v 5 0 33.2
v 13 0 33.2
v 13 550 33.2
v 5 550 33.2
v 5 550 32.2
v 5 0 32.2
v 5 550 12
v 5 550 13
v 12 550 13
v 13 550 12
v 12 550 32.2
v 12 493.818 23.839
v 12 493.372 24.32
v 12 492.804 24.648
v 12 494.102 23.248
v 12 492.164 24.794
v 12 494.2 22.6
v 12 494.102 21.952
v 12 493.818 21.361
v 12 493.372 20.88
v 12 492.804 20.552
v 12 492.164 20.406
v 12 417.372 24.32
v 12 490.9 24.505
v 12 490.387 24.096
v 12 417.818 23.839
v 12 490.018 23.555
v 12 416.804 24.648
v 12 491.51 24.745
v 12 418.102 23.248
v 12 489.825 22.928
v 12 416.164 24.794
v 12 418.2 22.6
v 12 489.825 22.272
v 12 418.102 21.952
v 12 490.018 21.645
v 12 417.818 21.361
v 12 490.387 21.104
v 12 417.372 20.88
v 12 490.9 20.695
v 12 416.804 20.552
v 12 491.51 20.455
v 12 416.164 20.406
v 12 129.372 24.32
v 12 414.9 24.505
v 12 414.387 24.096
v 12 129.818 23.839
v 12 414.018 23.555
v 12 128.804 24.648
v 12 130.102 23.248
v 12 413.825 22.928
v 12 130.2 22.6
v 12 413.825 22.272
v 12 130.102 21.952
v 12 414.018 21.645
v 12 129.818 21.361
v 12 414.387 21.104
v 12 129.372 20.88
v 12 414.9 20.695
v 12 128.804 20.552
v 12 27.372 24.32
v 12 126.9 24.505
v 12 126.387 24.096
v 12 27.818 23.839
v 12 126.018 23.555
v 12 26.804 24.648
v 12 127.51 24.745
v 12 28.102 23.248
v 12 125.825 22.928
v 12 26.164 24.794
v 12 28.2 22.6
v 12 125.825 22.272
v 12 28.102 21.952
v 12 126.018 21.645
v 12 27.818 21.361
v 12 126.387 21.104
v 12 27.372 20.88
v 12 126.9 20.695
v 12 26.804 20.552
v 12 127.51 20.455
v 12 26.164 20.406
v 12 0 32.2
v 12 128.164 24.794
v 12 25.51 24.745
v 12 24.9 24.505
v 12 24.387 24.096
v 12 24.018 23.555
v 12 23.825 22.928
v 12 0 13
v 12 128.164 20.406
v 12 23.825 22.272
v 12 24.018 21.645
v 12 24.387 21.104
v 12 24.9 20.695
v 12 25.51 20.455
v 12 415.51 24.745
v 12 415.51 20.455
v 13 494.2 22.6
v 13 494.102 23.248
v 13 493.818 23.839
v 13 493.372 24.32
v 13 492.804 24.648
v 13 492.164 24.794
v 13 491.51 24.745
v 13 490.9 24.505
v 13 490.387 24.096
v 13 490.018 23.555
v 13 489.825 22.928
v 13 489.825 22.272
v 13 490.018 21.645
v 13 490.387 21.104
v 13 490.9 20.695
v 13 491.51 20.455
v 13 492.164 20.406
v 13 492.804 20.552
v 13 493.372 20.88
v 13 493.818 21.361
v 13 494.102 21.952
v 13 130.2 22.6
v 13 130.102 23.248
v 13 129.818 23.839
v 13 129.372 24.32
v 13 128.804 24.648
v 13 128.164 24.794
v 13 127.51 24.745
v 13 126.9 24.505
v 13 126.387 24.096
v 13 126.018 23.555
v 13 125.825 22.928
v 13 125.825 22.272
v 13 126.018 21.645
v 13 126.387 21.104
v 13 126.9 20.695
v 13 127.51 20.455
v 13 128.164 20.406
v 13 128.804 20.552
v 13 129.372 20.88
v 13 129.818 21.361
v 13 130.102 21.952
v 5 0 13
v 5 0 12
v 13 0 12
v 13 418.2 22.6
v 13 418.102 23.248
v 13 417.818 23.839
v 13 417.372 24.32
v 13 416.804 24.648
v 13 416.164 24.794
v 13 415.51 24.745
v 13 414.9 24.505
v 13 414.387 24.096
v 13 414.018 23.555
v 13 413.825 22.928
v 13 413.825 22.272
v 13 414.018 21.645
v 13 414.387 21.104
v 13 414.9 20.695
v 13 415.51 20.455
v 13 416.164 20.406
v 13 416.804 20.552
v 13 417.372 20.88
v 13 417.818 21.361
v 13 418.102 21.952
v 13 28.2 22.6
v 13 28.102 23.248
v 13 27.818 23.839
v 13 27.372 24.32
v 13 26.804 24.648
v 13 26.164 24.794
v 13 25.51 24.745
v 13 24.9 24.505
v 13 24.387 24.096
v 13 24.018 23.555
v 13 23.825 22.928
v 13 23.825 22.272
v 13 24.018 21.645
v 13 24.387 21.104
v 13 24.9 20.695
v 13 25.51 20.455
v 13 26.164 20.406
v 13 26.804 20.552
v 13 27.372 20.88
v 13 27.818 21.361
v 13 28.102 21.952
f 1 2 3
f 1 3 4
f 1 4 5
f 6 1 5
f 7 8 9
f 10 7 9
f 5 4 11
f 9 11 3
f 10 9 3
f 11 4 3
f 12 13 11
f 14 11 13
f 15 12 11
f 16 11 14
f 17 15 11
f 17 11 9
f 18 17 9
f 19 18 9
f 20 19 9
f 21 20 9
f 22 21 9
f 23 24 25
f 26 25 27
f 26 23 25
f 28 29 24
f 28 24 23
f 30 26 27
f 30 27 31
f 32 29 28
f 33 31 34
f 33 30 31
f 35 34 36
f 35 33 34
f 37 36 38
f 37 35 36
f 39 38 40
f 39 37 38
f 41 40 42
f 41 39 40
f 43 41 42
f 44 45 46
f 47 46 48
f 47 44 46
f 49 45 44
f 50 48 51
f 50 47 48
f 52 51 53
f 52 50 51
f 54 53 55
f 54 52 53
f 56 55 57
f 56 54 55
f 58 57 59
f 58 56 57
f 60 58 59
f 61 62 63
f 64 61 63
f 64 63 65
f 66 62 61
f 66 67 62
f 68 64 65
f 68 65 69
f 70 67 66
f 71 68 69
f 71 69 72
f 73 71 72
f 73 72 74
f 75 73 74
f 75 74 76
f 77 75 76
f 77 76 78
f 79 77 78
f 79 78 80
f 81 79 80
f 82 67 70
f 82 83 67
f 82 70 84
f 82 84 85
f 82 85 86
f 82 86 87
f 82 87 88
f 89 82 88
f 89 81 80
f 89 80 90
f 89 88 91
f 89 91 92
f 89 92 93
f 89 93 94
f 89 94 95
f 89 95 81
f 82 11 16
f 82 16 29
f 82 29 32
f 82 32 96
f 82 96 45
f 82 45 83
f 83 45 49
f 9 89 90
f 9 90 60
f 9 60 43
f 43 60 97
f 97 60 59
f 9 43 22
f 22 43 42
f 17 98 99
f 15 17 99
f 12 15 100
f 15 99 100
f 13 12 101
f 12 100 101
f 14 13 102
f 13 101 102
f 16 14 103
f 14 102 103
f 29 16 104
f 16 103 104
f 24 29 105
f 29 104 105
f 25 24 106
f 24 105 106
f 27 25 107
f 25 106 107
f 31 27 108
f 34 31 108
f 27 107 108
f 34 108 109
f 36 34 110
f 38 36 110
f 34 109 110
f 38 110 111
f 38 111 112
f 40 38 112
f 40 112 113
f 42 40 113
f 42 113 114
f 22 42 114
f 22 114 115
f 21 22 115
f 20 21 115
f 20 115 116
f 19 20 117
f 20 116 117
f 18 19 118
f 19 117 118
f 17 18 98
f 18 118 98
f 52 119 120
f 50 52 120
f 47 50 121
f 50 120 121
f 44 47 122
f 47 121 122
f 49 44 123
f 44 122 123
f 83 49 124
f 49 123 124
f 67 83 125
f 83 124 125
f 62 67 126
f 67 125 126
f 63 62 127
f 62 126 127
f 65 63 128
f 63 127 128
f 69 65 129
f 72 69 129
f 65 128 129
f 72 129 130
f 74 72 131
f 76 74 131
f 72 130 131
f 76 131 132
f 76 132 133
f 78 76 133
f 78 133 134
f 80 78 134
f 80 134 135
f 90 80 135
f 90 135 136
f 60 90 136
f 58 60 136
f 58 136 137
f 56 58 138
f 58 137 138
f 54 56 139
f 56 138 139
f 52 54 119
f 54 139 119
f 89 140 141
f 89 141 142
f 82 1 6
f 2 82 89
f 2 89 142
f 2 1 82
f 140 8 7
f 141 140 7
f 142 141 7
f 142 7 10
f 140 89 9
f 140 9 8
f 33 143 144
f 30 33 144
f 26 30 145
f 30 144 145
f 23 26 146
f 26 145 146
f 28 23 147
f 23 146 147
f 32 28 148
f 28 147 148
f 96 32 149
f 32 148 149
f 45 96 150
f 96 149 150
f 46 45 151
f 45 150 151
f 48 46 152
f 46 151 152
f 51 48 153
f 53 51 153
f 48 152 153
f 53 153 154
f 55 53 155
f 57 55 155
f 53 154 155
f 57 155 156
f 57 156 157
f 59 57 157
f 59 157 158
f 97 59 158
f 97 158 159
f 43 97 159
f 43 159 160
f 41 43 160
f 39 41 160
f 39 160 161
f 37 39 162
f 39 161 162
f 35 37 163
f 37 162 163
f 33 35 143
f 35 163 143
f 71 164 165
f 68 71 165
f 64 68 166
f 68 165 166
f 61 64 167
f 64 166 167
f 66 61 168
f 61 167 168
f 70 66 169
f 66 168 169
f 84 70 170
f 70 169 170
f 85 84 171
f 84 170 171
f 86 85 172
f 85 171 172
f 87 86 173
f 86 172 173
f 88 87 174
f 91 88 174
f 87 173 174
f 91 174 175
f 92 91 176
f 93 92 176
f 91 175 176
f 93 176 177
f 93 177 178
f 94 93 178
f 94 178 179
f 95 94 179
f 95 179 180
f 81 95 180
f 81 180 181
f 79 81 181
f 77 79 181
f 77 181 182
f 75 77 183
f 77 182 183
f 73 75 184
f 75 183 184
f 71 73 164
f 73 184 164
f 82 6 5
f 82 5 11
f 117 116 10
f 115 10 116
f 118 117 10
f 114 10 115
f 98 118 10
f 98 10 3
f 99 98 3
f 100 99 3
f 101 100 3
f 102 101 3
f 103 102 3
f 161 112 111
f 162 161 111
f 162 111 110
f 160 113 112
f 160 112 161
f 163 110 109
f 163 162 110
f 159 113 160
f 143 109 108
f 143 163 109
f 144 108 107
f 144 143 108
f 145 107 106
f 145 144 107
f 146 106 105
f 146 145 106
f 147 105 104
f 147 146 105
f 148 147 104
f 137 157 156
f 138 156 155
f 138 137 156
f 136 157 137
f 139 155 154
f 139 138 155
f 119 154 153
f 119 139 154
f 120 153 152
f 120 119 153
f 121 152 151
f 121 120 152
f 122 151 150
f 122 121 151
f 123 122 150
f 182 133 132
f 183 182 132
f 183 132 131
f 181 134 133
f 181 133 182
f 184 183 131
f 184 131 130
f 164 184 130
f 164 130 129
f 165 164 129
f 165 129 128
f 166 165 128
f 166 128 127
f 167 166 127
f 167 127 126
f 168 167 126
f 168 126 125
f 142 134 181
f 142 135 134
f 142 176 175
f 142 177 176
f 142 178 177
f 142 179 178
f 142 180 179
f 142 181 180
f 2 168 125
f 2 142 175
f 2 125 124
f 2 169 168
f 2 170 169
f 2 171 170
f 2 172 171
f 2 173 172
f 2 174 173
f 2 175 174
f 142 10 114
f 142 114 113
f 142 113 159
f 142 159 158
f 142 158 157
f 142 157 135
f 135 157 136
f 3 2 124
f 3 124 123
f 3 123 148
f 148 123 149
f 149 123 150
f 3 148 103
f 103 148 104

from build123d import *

# Parameters (mm, degrees)
F1_DEPTH = 550
F2_R     = 2.2
F3_DEPTH = 1


with BuildPart() as f1:
    # F0 (on Front) → F1 (new body)
    with BuildSketch(Plane.XZ):
        Polygon((5, 13), (5, 12), (13, 12), (13, 33.2), (5, 33.2), (5, 32.2), (6, 32.2), (12, 32.2), (12, 13), (6, 13), align=None)
    extrude(amount=-F1_DEPTH)

    # F2 (on face) → F3 (cut)
    with BuildSketch(Plane.YZ.offset(13)):
        with Locations((26, 22.6)):
            Circle(F2_R)
        with Locations((128, 22.6)):
            Circle(F2_R)
        with Locations((416, 22.6)):
            Circle(F2_R)
        with Locations((492, 22.6)):
            Circle(F2_R)
    extrude(amount=-F3_DEPTH, mode=Mode.SUBTRACT)


solid = f1.part
